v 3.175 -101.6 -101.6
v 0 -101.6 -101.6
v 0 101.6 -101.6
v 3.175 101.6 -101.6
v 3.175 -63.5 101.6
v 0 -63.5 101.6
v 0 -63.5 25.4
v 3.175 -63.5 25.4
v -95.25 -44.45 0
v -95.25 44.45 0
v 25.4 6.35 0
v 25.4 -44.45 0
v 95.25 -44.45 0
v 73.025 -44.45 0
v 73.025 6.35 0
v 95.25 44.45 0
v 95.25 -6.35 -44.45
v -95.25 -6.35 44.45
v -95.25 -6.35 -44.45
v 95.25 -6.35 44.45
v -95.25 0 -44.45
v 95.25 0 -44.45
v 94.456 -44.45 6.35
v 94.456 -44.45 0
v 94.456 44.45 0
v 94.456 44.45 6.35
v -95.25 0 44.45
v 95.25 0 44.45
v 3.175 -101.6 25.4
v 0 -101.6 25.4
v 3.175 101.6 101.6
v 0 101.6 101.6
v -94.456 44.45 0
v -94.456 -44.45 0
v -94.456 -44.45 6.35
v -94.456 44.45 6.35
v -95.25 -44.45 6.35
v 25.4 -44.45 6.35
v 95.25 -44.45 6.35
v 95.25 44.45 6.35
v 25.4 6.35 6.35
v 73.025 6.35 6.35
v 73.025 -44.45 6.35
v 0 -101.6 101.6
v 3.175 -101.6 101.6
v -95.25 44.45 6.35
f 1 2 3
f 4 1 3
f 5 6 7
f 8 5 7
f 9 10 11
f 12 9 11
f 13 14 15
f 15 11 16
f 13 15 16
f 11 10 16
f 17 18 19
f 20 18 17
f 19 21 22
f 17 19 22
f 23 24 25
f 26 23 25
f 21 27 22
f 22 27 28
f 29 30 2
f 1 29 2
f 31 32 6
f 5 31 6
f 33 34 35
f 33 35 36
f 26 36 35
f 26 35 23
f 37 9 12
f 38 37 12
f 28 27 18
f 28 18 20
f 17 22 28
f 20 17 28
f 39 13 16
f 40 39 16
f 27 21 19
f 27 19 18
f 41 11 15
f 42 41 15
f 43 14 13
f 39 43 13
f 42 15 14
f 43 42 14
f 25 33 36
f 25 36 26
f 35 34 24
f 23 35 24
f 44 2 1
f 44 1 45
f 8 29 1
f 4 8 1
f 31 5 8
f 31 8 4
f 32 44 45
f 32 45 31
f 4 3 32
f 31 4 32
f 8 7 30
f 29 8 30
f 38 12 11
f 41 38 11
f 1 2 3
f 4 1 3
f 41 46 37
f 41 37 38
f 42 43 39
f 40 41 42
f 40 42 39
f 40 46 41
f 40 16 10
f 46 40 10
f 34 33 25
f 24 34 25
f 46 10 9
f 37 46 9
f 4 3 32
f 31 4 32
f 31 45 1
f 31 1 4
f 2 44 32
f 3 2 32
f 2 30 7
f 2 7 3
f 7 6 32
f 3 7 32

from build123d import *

# Parameters (mm, degrees)
F0_W     = 190.5
F0_H     = 88.9
F1_DEPTH = 6.35
F3_DEPTH = 6.35
F4_W     = 188.9125
F4_H     = 88.9
F5_DEPTH = 6.35
F6_W     = 203.2
F6_H     = 203.2
F7_DEPTH = 3.175
F9_DEPTH = 3.175


with BuildPart() as f1:
    # F0 (on Front) → F1 (new body)
    with BuildSketch(Plane.XZ):
        Rectangle(F0_W, F0_H)
    extrude(amount=F1_DEPTH)


with BuildPart() as f3:
    # F2 (on Top) → F3 (new body)
    with BuildSketch(Plane.XY):
        Polygon((95.25, -44.45), (95.25, 44.45), (-95.25, 44.45), (-95.25, -44.45), (25.4, -44.45), (25.4, 6.35), (73.025, 6.35), (73.025, -44.45), align=None)
    extrude(amount=F3_DEPTH)


with BuildPart() as f5:
    # F4 (on Top) → F5 (new body)
    with BuildSketch(Plane.XY):
        Rectangle(F4_W, F4_H)
    extrude(amount=F5_DEPTH)


with BuildPart() as f7:
    # F6 (on Right) → F7 (new body)
    with BuildSketch(Plane.YZ):
        Rectangle(F6_W, F6_H)
    extrude(amount=F7_DEPTH)


with BuildPart() as f9:
    # F8 (on Right) → F9 (new body)
    with BuildSketch(Plane.YZ):
        Polygon((-101.6, 25.4), (-101.6, -101.6), (101.6, -101.6), (101.6, 101.6), (-63.5, 101.6), (-63.5, 25.4), align=None)
    extrude(amount=F9_DEPTH)


solid = Compound([f1.part, f3.part, f5.part, f7.part, f9.part])
